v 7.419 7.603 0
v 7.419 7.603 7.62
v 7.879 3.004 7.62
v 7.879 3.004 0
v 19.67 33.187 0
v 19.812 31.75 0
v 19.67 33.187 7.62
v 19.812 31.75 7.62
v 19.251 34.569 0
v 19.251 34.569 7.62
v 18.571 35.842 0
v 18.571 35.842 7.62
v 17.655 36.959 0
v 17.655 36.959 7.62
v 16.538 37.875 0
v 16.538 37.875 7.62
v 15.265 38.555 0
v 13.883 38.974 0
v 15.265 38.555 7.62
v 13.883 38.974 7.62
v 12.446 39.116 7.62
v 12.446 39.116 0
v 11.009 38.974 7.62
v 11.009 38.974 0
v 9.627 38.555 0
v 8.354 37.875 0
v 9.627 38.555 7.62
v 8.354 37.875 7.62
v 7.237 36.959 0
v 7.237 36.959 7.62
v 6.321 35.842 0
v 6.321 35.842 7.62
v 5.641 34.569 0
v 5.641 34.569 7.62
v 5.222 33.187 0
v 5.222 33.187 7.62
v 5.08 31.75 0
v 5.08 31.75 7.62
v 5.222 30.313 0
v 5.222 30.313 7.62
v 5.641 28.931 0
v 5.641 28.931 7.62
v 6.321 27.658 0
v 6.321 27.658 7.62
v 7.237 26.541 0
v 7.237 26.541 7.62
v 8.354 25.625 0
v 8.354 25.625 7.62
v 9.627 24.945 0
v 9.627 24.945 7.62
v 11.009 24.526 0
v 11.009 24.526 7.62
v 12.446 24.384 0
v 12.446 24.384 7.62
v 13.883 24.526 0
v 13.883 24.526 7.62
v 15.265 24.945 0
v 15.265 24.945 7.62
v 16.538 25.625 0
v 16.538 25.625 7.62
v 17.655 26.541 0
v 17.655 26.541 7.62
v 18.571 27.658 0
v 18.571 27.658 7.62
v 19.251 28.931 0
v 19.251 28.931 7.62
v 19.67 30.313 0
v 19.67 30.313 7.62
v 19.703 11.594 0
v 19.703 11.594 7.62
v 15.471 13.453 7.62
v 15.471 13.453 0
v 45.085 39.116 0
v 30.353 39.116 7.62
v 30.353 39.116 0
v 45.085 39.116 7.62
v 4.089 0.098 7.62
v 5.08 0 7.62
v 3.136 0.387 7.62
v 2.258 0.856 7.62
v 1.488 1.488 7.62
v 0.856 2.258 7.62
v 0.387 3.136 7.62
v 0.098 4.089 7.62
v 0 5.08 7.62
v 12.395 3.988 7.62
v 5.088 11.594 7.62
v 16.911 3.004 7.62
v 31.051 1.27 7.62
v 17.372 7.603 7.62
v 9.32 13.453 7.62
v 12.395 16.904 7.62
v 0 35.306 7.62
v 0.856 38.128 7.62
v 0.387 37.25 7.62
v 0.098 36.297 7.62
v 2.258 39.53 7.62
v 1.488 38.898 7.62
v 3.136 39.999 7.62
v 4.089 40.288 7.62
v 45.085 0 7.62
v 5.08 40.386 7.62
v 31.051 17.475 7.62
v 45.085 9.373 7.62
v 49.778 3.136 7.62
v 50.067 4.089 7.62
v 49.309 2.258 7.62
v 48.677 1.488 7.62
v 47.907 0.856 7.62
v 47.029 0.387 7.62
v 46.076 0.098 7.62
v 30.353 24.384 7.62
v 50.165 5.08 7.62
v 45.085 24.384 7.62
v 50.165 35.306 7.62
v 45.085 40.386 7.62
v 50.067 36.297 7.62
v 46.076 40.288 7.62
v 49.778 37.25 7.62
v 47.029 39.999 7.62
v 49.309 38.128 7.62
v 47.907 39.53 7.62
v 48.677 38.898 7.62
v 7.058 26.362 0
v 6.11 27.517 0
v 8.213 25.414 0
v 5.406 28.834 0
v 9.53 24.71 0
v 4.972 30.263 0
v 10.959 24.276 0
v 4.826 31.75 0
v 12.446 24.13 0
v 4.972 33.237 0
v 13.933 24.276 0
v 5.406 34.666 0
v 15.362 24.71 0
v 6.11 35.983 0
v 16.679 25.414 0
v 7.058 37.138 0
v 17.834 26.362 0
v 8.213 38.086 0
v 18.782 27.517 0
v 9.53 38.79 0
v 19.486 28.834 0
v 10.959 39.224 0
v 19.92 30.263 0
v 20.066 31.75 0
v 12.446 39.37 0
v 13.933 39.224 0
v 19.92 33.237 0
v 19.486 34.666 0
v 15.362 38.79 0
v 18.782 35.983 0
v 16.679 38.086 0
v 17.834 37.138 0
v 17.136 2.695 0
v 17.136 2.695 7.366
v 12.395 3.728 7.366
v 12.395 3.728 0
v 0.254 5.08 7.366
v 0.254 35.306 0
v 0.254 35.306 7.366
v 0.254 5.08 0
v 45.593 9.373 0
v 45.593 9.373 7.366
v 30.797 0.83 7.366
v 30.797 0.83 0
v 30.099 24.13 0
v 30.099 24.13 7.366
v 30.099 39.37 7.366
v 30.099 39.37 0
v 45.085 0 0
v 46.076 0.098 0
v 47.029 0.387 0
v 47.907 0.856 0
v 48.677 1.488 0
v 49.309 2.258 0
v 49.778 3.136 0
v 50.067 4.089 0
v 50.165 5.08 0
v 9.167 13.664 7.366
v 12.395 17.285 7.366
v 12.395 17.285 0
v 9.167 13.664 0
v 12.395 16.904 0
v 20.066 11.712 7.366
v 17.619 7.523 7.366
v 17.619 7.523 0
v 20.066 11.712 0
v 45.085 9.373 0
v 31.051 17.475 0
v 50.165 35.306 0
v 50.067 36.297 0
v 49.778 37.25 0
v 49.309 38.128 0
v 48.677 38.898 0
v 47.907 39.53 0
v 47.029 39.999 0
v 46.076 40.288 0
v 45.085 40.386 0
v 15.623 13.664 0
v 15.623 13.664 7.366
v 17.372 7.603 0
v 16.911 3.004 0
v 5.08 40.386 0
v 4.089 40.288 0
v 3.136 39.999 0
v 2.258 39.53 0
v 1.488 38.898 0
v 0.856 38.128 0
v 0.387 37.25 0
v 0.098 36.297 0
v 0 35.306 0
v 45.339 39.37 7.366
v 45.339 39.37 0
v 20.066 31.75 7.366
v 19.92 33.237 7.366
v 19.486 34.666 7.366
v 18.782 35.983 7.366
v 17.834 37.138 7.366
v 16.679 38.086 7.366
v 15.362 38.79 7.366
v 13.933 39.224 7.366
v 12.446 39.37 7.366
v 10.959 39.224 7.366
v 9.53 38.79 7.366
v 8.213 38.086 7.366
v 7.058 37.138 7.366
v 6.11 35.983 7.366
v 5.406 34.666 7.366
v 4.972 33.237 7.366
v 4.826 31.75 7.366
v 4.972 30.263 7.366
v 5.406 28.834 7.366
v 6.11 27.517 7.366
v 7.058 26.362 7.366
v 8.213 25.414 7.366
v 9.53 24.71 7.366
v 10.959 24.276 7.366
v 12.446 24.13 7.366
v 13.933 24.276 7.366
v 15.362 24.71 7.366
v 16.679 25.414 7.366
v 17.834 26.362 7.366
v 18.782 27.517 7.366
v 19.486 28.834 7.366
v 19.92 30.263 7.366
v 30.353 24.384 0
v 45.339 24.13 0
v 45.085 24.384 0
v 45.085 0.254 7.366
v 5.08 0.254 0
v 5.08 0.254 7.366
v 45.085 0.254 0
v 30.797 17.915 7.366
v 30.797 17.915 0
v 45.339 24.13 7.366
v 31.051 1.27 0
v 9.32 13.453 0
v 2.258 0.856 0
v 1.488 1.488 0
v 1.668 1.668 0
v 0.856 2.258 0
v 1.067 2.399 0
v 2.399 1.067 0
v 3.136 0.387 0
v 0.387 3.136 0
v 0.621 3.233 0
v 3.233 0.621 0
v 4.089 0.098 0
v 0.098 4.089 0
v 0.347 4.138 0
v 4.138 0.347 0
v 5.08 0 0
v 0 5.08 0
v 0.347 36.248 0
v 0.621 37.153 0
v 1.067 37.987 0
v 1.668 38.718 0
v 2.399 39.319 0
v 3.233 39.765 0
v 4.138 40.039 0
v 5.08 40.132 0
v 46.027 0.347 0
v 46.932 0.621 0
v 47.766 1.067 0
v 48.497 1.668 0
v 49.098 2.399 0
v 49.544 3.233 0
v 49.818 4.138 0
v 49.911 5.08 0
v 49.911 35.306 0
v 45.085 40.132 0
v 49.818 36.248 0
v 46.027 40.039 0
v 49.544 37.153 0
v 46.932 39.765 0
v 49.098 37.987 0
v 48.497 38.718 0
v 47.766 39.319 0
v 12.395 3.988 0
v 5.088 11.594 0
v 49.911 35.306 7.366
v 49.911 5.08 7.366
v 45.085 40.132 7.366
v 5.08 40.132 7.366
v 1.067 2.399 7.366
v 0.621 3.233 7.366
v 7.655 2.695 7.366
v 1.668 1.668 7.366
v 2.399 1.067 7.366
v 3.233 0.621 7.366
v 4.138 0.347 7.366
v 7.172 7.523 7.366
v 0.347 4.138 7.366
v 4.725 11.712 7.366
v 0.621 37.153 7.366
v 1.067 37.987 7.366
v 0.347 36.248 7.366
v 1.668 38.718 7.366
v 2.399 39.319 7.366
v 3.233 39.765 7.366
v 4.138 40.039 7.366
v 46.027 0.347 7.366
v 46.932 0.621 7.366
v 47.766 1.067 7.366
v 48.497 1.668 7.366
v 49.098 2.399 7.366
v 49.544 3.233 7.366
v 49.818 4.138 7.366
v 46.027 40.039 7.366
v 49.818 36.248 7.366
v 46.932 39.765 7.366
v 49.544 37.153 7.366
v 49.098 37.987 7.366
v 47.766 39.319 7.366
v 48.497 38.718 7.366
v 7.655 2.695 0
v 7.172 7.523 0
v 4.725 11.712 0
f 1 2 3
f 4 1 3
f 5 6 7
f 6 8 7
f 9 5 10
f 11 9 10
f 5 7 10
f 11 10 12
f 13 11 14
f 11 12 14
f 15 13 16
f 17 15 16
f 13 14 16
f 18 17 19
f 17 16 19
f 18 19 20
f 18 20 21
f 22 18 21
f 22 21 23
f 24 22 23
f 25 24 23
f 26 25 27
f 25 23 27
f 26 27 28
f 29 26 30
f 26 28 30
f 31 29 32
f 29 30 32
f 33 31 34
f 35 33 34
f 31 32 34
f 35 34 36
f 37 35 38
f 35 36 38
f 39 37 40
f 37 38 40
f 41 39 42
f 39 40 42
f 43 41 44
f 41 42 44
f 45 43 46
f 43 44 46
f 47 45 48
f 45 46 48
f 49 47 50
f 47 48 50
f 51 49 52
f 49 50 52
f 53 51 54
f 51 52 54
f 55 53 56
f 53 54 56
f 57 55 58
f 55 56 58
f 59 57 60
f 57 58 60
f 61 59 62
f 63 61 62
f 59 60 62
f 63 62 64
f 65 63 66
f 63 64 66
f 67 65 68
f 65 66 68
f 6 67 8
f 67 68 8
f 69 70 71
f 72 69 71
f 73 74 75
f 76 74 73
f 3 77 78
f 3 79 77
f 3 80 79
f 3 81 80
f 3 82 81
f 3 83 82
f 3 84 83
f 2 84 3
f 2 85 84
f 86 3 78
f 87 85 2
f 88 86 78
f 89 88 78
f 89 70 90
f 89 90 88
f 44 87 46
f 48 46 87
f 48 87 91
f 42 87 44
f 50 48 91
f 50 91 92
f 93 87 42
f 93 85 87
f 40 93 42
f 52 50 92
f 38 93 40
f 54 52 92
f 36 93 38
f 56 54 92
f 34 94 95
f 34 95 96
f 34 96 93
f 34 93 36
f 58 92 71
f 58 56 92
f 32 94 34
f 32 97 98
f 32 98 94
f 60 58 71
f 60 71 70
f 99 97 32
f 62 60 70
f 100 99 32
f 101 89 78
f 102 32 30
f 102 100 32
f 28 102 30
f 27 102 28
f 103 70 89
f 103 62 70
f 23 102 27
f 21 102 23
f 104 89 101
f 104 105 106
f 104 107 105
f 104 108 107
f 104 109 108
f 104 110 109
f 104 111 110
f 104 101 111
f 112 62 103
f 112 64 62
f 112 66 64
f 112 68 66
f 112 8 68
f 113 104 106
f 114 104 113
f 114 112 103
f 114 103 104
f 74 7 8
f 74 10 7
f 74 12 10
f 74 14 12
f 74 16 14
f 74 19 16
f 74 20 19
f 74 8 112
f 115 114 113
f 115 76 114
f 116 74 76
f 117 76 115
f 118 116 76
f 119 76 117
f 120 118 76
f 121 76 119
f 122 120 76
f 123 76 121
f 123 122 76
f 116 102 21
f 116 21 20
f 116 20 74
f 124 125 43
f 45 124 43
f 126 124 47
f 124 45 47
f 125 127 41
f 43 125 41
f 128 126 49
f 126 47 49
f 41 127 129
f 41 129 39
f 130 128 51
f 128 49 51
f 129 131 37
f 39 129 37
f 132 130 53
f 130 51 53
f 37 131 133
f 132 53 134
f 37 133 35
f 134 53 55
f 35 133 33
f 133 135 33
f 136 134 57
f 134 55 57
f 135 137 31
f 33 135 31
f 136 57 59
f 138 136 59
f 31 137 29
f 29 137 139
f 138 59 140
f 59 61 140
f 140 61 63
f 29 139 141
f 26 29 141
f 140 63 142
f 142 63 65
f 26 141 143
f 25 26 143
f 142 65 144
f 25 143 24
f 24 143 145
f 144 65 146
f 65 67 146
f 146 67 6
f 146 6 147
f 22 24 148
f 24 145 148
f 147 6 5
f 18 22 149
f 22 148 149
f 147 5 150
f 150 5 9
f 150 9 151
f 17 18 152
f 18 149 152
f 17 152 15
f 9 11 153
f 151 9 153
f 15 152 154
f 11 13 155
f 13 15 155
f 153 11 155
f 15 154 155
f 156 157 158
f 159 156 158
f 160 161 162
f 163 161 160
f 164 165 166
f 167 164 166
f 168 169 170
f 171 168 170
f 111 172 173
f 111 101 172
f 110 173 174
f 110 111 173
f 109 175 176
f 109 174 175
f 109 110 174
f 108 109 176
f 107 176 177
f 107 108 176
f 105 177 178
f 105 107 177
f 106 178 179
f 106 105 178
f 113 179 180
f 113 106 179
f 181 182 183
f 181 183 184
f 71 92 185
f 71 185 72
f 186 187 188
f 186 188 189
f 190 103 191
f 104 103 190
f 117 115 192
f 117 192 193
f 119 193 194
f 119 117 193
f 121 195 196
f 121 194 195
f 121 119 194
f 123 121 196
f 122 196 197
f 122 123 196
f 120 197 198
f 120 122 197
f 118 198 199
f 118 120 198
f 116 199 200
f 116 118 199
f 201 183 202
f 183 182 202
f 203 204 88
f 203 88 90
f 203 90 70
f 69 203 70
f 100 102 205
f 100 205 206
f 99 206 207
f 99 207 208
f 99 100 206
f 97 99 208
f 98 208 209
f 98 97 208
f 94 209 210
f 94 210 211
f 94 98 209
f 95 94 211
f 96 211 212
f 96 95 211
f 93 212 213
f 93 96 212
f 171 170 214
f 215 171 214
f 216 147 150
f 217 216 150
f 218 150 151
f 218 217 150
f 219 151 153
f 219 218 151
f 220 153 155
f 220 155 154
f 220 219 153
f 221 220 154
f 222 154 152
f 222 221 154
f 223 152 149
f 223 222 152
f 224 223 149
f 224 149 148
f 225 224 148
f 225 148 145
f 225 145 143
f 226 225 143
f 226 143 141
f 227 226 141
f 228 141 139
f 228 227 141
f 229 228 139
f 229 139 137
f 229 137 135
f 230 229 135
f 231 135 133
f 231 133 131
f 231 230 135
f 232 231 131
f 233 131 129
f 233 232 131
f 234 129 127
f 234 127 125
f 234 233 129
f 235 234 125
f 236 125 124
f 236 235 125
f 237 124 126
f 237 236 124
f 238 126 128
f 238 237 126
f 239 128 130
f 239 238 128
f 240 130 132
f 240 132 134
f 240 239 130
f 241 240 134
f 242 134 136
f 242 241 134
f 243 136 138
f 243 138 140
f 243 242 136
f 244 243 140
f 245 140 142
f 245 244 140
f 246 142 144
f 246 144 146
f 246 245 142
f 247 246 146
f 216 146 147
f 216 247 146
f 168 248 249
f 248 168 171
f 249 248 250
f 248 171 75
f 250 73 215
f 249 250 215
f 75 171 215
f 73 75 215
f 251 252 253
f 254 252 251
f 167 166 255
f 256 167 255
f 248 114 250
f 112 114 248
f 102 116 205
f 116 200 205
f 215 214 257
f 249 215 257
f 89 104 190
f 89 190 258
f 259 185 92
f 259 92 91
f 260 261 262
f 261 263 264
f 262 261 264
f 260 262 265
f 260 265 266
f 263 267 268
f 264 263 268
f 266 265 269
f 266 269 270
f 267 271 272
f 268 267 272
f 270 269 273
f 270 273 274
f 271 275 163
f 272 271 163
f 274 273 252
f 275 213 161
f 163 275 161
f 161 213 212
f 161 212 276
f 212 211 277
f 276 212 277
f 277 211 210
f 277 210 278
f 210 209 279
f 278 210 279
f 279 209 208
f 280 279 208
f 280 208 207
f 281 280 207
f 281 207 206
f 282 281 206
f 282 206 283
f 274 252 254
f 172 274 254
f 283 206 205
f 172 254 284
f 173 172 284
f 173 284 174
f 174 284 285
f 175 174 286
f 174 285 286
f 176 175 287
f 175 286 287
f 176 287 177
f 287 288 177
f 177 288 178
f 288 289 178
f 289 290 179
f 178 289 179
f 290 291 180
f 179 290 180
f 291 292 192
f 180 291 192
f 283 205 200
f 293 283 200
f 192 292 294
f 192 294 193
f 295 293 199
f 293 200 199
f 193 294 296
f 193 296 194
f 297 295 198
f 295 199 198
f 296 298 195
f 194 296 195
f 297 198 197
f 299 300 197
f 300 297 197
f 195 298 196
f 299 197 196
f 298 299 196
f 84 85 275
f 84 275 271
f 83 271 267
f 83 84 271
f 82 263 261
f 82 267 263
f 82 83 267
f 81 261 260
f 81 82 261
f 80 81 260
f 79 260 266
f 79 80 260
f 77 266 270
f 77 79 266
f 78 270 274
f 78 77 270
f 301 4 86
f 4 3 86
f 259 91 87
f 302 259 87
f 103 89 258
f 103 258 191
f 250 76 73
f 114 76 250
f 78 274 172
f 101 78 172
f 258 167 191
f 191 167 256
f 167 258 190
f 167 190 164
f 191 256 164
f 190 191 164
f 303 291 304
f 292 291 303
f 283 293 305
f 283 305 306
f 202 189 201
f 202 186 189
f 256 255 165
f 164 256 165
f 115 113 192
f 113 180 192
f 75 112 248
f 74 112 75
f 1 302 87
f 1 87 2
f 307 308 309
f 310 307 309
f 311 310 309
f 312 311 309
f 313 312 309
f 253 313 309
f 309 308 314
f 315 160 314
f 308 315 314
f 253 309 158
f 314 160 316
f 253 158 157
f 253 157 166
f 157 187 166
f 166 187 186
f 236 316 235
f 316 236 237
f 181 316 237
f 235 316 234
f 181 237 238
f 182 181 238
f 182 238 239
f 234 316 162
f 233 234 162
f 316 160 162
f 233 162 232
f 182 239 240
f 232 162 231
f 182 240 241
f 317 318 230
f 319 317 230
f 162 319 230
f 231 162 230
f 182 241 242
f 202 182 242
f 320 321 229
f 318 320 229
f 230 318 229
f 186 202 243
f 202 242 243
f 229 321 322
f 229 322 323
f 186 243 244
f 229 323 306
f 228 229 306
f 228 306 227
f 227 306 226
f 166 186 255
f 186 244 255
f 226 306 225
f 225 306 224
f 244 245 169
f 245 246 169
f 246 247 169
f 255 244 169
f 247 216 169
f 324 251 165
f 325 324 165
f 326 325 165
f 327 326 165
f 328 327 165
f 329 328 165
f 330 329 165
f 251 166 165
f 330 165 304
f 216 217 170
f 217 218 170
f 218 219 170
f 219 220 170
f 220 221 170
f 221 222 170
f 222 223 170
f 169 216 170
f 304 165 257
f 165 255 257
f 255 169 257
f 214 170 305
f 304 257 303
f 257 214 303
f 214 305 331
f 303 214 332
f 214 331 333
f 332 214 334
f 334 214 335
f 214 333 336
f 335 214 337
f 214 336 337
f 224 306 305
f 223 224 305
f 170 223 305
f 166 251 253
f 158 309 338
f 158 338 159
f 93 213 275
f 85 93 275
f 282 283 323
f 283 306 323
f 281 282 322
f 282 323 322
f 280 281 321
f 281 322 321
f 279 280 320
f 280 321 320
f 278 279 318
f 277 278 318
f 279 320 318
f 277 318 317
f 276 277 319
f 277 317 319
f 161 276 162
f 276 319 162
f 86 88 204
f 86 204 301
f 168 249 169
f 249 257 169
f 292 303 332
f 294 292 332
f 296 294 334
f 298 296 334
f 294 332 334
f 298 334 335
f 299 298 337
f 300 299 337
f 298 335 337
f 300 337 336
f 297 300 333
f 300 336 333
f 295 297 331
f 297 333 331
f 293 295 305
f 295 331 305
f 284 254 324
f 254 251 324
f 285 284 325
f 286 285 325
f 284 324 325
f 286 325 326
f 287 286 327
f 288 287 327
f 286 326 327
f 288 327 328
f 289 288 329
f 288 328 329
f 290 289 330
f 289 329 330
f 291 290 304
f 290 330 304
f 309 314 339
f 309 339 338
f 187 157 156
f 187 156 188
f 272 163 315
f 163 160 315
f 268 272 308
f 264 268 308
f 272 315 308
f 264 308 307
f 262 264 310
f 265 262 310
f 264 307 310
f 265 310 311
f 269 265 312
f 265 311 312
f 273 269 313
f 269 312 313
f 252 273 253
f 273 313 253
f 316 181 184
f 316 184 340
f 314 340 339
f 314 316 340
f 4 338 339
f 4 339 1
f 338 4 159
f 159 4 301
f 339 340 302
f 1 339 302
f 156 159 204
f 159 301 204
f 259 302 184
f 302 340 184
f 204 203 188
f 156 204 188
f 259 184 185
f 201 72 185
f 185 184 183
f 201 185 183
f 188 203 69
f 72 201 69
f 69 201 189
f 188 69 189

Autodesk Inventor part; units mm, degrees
ref_plane "YZ Plane" through (0, 0, 0) normal (1, 0, 0) x (0, 1, 0)
ref_plane "XZ Plane" through (0, 0, 0) normal (0, 1, 0) x (-1, 0, 0)
ref_plane "XY Plane" through (0, 0, 0) normal (0, 0, 1) x (1, 0, 0)
sketch "Sketch1" plane through (0, 0, 0) normal (0, 0, 1) x (1, 0, 0)
  line L0 (0, 0) -> (50.165, 0)
  line L1 (50.165, 0) -> (50.165, 40.386)
  line L2 (50.165, 40.386) -> (0, 40.386)
  line L3 (0, 40.386) -> (0, 0)
  dimension "d0" = 50.165
  dimension "d1" = 40.386
extrude "Extrusion1" add sketch "Sketch1" along normal blind 7.62
sketch "Sketch2" plane through (0, 0, 7.62) normal (0, 0, 1) x (1, 0, 0)
  circle A0 centre (12.446, 31.75) radius 7.366
  line L0 (0, 40.386) -> (0, 0) projected
  line L1 (50.165, 40.386) -> (0, 40.386) projected
  line L2 (30.353, 39.116) -> (45.085, 39.116)
  line L3 (45.085, 39.116) -> (45.085, 24.384)
  line L4 (45.085, 24.384) -> (30.353, 24.384)
  line L5 (30.353, 24.384) -> (30.353, 39.116)
  line L6 (50.165, 0) -> (50.165, 40.386) projected
  line L7 (31.0509, 1.27) -> (31.0509, 17.4752)
  line L8 (31.0509, 17.4752) -> (45.085, 9.3726)
  line L9 (45.085, 9.3726) -> (31.0509, 1.27)
  line L10 (0, 0) -> (50.165, 0) projected
  circle A1 centre (12.3952, 9.2202) radius 7.6835 construction
  line L11 (12.3952, 16.9037) -> (19.7026, 11.5945) construction
  line L12 (19.7026, 11.5945) -> (16.9114, 3.0041) construction
  line L13 (16.9114, 3.0041) -> (7.879, 3.0041) construction
  line L14 (7.879, 3.0041) -> (5.0878, 11.5945) construction
  line L15 (5.0878, 11.5945) -> (12.3952, 16.9037) construction
  circle A2 centre (12.3952, 9.2202) radius 5.2324 construction
  line L16 (12.3952, 16.9037) -> (9.3197, 13.4533)
  line L17 (9.3197, 13.4533) -> (5.0878, 11.5945)
  line L18 (5.0878, 11.5945) -> (7.4189, 7.6033)
  line L19 (7.4189, 7.6033) -> (7.879, 3.0041)
  line L20 (7.879, 3.0041) -> (12.3952, 3.9878)
  line L21 (16.9114, 3.0041) -> (12.3952, 3.9878)
  line L22 (16.9114, 3.0041) -> (17.3715, 7.6033)
  line L23 (17.3715, 7.6033) -> (19.7026, 11.5945)
  line L24 (12.3952, 16.9037) -> (15.4707, 13.4533)
  line L25 (19.7026, 11.5945) -> (15.4707, 13.4533)
  point P0 (35.7289, 9.3726)
  dimension "d4" = 14.732
  dimension "d5" = 12.446
  dimension "d6" = 8.636
  dimension "d7" = 14.732
  dimension "d8" = 5.08
  dimension "d9" = 1.27
  dimension "d10" = 14.732
  dimension "d11" = 16.2052
  dimension "d12" = 1.27
  dimension "d13" = 5.08
  dimension "d14" = 15.367
  dimension "d15" = 12.3952
  dimension "d16" = 9.2202
  dimension "d17" = 10.4648
extrude "Extrusion2" cut sketch "Sketch2" against normal blind 25.4 contours A0 | L2 L3 L4 L5 | L7 L8 L9 | L24 L25 L23 L22 L21 L20 L19 L18 L17 L16
fillet "Fillet1" radius 5.08 1 edges at (50.165, 40.386, 3.81)
fillet "Fillet2" radius 5.08 1 edges at (0, 40.386, 3.81)
fillet "Fillet3" radius 5.08 1 edges at (50.165, 0, 3.81)
fillet "Fillet4" radius 5.08 1 edges at (0, 0, 3.81)
shell "Shell1" thickness 0.254 removed faces 1 at (40.407, 17.0773, 0)
properties part number "PassengerBaseNT"
